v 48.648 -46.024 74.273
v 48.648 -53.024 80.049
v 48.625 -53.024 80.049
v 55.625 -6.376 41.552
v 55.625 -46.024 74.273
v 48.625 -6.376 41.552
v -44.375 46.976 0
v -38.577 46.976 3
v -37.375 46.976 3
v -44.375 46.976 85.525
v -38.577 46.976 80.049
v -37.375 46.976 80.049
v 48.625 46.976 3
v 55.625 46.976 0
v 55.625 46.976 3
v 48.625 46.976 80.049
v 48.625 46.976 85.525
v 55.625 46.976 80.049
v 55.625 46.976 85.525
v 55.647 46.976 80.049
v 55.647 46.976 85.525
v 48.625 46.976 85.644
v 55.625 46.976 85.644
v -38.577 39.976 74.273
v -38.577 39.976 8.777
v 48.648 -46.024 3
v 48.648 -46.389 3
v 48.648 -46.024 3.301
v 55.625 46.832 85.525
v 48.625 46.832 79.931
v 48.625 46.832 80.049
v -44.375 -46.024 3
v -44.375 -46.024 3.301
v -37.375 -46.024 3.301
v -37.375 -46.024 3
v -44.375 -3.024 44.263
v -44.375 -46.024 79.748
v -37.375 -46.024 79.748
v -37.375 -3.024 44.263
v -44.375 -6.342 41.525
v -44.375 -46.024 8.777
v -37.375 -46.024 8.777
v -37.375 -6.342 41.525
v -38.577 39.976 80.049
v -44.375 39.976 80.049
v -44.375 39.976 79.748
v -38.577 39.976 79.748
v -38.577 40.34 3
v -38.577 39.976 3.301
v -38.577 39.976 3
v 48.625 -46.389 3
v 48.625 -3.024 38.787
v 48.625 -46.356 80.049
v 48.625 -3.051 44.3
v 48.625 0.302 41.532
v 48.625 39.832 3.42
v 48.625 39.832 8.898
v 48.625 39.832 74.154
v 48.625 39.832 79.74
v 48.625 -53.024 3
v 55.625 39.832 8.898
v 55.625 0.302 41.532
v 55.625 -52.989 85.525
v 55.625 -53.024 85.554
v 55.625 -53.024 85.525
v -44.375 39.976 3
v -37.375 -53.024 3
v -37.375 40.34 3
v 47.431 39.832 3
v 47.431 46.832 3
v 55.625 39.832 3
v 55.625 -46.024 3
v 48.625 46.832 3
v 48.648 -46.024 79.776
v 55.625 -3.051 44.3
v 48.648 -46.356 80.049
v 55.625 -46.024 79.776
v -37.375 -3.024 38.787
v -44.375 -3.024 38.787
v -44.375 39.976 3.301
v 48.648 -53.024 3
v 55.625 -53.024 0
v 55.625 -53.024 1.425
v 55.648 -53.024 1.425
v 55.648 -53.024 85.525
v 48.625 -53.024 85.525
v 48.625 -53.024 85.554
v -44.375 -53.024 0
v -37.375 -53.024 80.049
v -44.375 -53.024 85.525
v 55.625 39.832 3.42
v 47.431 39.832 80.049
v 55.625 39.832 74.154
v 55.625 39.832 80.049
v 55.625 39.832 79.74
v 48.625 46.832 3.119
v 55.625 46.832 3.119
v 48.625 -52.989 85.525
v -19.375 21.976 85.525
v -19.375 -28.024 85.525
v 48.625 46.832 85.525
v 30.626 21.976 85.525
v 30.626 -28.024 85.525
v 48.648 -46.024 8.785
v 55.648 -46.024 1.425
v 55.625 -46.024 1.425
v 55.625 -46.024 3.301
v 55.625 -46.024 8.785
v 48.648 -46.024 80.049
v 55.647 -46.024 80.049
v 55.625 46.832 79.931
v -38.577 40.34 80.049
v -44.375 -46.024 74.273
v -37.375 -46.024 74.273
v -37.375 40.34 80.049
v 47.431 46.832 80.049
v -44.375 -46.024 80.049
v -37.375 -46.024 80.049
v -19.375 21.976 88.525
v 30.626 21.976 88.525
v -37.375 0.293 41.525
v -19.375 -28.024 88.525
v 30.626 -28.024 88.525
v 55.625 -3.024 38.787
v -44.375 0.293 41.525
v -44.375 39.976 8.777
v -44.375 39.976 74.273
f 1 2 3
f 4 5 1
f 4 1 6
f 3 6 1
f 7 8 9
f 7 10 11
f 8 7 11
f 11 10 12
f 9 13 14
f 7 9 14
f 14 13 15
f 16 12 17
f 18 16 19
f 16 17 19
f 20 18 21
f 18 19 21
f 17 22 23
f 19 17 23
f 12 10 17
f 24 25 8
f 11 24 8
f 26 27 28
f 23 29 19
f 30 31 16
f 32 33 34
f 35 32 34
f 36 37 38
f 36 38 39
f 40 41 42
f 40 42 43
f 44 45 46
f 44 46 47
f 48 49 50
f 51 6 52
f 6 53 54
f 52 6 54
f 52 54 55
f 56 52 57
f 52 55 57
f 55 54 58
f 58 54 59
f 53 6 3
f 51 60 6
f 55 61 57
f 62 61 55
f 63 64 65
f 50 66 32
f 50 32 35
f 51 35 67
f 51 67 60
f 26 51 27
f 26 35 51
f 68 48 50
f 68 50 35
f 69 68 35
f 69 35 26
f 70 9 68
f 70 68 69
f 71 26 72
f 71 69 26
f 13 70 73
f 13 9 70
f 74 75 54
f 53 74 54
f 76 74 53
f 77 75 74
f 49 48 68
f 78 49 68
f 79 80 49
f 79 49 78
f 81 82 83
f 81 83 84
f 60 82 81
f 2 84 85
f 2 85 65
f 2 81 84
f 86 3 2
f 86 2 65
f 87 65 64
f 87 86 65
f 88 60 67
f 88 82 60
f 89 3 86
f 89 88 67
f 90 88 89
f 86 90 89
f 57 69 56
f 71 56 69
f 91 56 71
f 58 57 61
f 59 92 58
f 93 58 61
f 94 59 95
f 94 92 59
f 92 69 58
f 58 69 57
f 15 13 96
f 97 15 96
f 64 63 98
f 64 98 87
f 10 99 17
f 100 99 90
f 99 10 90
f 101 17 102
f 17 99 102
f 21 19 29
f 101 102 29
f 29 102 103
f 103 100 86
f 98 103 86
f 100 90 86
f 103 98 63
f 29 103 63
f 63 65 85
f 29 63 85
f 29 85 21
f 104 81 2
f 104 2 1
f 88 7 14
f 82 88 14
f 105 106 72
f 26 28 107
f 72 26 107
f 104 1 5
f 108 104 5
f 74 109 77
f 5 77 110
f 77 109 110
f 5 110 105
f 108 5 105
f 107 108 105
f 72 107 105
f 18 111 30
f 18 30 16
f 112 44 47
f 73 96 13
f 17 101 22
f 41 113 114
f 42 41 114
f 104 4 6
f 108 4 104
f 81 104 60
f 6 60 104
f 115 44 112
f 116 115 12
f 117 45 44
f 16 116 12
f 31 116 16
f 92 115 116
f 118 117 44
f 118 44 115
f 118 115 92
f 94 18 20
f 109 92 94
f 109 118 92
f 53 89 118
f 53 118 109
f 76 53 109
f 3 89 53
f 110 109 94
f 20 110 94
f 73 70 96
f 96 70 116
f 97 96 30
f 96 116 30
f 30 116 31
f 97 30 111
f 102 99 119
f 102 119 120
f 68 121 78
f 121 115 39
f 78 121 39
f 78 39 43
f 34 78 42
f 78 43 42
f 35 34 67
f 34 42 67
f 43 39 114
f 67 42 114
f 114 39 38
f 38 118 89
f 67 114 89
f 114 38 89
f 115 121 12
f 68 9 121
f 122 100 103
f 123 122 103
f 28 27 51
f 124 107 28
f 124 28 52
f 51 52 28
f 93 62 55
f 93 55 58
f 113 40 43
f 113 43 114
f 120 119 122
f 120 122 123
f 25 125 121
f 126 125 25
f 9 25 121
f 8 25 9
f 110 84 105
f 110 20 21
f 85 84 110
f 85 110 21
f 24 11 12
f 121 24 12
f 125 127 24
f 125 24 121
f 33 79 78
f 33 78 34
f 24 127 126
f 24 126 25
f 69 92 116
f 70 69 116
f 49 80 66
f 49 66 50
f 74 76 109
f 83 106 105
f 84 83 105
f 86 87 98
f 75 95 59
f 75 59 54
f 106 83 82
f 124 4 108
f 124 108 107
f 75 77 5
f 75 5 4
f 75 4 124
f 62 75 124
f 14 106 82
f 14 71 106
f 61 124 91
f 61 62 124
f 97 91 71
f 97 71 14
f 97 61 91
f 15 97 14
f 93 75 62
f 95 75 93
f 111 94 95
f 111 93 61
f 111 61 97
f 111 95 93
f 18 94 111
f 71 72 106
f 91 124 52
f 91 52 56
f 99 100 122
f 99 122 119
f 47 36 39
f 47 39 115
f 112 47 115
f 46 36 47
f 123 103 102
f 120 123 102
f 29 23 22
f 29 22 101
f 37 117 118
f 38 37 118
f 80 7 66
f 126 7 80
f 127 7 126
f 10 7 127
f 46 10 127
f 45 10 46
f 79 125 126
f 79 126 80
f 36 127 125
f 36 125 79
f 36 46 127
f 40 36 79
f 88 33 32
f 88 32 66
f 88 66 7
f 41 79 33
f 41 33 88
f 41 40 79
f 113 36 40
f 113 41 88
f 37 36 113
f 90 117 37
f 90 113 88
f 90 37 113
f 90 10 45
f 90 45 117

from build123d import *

# Parameters (mm, degrees)
F0_W      = 100
F0_H      = 100
F1_DEPTH  = 3
F3_DEPTH  = 7
F5_DEPTH  = 7
F7_DEPTH  = 7
F9_DEPTH  = 7
F10_W     = 100.0225
F10_H     = 5.475754
F11_DEPTH = 100
F12_W     = 50.0005
F12_H     = 50
F13_DEPTH = 3
F14_W     = 5.79754
F14_H     = 7
F14_W_2   = 8.194392
F14_W_3   = 7
F15_DEPTH = 84.1


with BuildPart() as f1:
    # F0 (on Top) → F1 (new body)
    with BuildSketch(Plane.XY):
        with Locations((5.625, -3.024291)):
            Rectangle(F0_W, F0_H)
    extrude(amount=F1_DEPTH)

    # F2 (on face) → F3 (join)
    with BuildSketch(Plane(origin=(-44.375, 0, 0), x_dir=(0, -1, 0), z_dir=(-1, 0, 0))):
        Polygon((-46.975709, 0), (-43.975709, 0), (53.024291, 80.049396), (53.024291, 85.52515), (-46.975709, 3), align=None)
    extrude(amount=-F3_DEPTH)

    # F4 (on face) → F5 (join)
    with BuildSketch(Plane(origin=(-44.375, 0, 0), x_dir=(0, -1, 0), z_dir=(-1, 0, 0))):
        Polygon((-46.975709, 80.049396), (50.024291, 0), (53.024291, 0), (53.024291, 3), (-46.975709, 85.52515), align=None)
    extrude(amount=-F5_DEPTH)

    # F6 (on face) → F7 (join)
    with BuildSketch(Plane.YZ.offset(55.625)):
        Polygon((-53.024291, 0), (-50.024291, 0), (46.975709, 80.049396), (46.975709, 85.644148), (-53.024291, 3), align=None)
    extrude(amount=-F7_DEPTH)

    # F8 (on face) → F9 (join)
    with BuildSketch(Plane.YZ.offset(55.625)):
        Polygon((-53.024291, 80.049396), (43.975709, 0), (46.975709, 0), (46.975709, 3), (-53.024291, 85.554466), align=None)
    extrude(amount=-F9_DEPTH)

    # F10 (on face) → F11 (join)
    with BuildSketch(Plane.XZ.offset(53.024291)):
        with Locations((5.63625, 82.787273)):
            Rectangle(F10_W, F10_H)
    extrude(amount=-F11_DEPTH)

    # F12 (on face) → F13 (join)
    with BuildSketch(Plane.XY.offset(85.52515)):
        with Locations((5.62525, -3.024291)):
            Rectangle(F12_W, F12_H)
    extrude(amount=F13_DEPTH)

    # F14 (on face) → F15 (join)
    with BuildSketch(Plane.XY.offset(85.52515)):
        with Locations((-41.47623, 43.475709)):
            Rectangle(F14_W, F14_H)
        with Locations((51.527804, 43.33172)):
            Rectangle(F14_W_2, F14_H)
        with Locations((52.1475, -49.524291)):
            Rectangle(F14_W_3, F14_H)
        with Locations((-40.875, -49.524291)):
            Rectangle(F14_W_3, F14_H)
    extrude(amount=-F15_DEPTH)


solid = f1.part
